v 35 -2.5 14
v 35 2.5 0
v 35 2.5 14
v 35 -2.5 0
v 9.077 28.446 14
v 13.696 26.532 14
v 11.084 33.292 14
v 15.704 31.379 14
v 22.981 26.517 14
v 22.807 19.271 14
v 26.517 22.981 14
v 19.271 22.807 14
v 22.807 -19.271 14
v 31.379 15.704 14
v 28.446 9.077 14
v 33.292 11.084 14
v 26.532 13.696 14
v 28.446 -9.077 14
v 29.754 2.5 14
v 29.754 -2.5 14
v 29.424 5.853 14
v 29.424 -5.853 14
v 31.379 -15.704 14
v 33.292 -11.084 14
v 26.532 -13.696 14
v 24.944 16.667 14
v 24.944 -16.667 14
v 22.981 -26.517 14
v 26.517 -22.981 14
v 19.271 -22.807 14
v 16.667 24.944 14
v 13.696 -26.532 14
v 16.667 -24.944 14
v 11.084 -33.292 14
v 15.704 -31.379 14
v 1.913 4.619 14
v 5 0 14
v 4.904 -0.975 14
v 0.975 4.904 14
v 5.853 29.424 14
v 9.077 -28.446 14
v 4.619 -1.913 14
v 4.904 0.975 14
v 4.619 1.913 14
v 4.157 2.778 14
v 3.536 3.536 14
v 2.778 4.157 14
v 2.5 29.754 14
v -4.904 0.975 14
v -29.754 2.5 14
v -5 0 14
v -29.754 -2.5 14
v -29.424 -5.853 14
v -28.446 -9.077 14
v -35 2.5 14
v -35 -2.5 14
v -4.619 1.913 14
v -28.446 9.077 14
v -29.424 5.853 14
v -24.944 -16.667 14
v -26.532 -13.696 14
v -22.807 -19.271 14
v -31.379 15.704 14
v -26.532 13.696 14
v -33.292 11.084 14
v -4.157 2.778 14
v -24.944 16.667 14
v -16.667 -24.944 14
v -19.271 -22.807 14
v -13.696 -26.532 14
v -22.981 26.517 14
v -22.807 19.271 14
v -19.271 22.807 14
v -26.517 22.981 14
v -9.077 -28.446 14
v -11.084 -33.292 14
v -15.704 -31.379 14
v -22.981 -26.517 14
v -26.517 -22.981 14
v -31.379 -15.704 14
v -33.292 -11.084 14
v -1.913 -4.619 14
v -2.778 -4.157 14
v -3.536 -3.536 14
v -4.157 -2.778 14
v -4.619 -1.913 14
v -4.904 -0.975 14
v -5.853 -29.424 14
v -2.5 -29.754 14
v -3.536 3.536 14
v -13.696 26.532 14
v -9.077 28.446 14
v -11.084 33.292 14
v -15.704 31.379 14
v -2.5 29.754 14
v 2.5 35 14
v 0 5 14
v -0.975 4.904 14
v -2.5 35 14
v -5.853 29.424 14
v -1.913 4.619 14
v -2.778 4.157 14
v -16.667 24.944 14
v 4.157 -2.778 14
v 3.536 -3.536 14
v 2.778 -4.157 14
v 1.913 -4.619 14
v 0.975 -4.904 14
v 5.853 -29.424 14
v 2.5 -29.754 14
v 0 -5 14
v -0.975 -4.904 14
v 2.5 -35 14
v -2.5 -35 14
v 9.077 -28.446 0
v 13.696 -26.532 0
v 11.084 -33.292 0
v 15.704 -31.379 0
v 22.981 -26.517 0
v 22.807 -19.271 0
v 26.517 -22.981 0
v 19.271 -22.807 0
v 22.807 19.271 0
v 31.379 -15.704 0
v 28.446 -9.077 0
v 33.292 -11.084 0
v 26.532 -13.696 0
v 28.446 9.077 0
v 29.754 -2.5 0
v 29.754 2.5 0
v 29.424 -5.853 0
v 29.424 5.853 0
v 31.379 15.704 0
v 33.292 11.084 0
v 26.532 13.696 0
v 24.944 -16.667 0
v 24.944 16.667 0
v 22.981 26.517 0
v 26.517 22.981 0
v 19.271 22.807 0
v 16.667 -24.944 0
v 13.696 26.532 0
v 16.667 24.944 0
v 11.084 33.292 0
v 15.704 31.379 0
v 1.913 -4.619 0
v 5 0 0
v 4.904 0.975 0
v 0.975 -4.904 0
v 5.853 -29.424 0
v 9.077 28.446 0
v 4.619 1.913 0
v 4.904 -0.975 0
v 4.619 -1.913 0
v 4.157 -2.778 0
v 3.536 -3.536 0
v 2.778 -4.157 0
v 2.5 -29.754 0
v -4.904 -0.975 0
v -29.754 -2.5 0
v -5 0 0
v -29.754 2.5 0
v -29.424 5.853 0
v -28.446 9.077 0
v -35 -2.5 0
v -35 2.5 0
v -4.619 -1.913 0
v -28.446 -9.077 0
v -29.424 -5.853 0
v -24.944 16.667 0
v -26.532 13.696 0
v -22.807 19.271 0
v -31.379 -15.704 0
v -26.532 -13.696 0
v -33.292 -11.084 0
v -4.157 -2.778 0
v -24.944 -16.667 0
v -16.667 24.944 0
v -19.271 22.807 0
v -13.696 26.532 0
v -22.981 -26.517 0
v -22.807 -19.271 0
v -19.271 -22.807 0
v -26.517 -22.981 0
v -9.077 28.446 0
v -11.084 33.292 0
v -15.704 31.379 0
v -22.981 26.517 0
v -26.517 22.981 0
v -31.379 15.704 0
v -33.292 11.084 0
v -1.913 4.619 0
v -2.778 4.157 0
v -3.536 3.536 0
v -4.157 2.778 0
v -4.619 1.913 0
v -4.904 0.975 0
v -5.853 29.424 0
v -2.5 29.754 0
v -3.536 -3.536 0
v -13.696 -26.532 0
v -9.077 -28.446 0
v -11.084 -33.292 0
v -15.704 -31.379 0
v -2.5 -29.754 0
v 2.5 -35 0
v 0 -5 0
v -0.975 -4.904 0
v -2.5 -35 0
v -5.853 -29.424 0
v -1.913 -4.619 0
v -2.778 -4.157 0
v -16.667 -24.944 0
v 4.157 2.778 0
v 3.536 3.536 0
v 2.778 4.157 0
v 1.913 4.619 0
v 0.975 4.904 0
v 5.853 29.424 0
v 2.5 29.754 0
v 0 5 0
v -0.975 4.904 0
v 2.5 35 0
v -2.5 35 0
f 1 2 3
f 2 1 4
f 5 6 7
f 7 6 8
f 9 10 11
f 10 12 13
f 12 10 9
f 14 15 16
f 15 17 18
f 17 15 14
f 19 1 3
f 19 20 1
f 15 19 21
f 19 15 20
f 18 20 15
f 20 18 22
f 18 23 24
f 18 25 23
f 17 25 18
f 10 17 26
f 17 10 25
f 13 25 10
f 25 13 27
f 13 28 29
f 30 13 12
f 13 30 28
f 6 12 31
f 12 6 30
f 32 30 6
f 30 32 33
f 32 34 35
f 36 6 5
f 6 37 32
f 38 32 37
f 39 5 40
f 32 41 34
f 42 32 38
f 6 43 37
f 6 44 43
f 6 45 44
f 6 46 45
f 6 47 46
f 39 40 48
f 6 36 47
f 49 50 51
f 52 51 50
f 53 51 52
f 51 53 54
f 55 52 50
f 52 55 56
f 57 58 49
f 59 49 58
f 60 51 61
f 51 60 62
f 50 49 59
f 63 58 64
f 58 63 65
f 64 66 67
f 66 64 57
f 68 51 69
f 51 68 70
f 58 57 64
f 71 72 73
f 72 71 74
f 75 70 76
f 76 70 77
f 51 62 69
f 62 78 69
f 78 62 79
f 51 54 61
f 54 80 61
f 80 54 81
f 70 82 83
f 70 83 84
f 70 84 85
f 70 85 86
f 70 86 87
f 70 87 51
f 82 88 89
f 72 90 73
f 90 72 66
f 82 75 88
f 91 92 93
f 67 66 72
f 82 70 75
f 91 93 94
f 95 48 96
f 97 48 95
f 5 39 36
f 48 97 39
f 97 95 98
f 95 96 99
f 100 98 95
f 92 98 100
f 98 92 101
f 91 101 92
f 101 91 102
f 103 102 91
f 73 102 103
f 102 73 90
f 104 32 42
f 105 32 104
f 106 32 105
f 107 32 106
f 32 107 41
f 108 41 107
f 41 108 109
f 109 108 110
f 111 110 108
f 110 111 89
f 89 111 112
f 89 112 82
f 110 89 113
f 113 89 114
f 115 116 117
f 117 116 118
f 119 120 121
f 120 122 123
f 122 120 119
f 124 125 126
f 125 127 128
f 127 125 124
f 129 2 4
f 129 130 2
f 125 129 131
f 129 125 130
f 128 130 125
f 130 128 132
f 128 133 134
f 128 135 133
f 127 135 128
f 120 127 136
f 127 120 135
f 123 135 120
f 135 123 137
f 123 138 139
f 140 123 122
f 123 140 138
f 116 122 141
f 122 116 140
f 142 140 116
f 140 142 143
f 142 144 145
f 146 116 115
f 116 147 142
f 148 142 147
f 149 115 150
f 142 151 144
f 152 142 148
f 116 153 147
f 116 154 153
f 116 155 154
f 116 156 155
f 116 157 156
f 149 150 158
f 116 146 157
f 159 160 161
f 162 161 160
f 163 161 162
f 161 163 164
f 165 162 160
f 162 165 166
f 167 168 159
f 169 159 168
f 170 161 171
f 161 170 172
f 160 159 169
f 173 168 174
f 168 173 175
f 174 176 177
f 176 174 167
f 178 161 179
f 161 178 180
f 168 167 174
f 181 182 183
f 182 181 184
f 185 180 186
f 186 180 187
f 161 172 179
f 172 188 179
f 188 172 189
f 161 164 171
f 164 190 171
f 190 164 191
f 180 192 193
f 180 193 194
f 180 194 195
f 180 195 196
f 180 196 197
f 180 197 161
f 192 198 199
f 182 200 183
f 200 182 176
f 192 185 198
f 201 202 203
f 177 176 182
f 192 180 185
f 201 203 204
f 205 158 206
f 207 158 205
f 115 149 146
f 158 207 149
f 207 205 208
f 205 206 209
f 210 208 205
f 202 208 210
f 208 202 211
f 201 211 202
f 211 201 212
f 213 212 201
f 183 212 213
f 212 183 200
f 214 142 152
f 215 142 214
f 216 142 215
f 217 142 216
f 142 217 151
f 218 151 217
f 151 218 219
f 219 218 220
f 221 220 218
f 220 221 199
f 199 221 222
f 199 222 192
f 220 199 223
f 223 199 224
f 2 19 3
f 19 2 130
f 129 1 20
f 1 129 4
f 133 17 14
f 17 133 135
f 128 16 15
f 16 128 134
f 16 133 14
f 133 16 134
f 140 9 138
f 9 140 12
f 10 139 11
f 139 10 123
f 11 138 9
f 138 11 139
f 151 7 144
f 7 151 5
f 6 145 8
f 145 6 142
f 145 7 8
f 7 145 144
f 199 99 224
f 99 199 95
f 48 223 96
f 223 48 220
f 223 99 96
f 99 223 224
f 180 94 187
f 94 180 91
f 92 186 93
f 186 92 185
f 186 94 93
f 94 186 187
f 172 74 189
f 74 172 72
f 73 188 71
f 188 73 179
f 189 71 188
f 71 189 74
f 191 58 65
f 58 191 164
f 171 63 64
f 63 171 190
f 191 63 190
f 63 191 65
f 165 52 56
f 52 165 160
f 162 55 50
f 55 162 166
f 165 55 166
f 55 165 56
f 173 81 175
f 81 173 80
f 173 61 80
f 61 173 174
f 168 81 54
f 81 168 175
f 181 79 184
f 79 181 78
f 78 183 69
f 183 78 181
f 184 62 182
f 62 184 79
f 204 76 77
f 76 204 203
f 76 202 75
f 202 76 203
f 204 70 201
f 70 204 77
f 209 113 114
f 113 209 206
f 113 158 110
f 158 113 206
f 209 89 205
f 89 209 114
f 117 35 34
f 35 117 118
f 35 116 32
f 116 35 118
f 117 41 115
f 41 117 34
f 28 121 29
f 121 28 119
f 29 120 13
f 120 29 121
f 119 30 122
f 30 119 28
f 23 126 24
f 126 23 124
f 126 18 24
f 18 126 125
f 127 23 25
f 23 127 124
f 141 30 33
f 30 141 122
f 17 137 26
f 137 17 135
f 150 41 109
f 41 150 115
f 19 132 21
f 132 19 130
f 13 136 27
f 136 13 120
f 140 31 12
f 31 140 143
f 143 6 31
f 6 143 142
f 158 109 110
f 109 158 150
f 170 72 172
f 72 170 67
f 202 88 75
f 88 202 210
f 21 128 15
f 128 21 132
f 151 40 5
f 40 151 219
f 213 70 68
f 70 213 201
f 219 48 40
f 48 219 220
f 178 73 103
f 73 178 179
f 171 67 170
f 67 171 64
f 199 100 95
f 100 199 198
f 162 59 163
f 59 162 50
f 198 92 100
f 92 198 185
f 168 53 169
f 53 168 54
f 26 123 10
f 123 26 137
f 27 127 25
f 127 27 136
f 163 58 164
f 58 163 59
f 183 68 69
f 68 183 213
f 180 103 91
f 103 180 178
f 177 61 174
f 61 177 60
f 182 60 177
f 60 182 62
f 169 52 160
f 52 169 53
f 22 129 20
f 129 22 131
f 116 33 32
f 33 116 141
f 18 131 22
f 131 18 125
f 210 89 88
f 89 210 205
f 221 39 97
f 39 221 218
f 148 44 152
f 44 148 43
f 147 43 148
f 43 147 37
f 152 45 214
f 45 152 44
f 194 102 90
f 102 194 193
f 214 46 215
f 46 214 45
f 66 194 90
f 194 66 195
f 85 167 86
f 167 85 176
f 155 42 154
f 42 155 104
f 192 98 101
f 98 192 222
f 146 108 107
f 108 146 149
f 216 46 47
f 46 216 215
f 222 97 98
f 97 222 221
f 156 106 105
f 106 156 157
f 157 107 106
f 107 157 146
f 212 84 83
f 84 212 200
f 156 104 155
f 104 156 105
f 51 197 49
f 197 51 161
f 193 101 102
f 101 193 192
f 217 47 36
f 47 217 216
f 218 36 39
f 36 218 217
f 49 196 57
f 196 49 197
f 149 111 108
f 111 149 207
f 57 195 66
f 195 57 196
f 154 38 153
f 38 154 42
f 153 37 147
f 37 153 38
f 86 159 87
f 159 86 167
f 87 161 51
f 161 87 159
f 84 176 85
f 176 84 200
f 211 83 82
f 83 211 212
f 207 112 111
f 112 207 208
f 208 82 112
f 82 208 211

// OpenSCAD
$fn = 32;

// ----------------------------------------------------------------------
// Spur blank: bored gear blank
// ----------------------------------------------------------------------

// --- parameters (mm) ---
disc_r = 30;              // blank root radius
disc_t = 14;              // blank thickness
n_teeth = 16;             // stub tooth count
tooth_w = 5;              // tooth width at the root
tooth_h = 5;              // tooth height above the root
bore_r = 5;               // central bore radius

out_r = disc_r + tooth_h;  // tip radius
bbox_x = 70.0;  // measured width over the teeth
bbox_y = 70.0;  // measured depth over the teeth

difference() {
union() {
  cylinder(r = disc_r, h = disc_t);
  for (i = [0 : n_teeth - 1])
    rotate([0, 0, i * 360 / n_teeth])
      translate([disc_r - 1, -tooth_w / 2, 0])
        cube([tooth_h + 1, tooth_w, disc_t]);
}
  translate([0, 0, -1]) cylinder(r = bore_r, h = disc_t + 2);
}
